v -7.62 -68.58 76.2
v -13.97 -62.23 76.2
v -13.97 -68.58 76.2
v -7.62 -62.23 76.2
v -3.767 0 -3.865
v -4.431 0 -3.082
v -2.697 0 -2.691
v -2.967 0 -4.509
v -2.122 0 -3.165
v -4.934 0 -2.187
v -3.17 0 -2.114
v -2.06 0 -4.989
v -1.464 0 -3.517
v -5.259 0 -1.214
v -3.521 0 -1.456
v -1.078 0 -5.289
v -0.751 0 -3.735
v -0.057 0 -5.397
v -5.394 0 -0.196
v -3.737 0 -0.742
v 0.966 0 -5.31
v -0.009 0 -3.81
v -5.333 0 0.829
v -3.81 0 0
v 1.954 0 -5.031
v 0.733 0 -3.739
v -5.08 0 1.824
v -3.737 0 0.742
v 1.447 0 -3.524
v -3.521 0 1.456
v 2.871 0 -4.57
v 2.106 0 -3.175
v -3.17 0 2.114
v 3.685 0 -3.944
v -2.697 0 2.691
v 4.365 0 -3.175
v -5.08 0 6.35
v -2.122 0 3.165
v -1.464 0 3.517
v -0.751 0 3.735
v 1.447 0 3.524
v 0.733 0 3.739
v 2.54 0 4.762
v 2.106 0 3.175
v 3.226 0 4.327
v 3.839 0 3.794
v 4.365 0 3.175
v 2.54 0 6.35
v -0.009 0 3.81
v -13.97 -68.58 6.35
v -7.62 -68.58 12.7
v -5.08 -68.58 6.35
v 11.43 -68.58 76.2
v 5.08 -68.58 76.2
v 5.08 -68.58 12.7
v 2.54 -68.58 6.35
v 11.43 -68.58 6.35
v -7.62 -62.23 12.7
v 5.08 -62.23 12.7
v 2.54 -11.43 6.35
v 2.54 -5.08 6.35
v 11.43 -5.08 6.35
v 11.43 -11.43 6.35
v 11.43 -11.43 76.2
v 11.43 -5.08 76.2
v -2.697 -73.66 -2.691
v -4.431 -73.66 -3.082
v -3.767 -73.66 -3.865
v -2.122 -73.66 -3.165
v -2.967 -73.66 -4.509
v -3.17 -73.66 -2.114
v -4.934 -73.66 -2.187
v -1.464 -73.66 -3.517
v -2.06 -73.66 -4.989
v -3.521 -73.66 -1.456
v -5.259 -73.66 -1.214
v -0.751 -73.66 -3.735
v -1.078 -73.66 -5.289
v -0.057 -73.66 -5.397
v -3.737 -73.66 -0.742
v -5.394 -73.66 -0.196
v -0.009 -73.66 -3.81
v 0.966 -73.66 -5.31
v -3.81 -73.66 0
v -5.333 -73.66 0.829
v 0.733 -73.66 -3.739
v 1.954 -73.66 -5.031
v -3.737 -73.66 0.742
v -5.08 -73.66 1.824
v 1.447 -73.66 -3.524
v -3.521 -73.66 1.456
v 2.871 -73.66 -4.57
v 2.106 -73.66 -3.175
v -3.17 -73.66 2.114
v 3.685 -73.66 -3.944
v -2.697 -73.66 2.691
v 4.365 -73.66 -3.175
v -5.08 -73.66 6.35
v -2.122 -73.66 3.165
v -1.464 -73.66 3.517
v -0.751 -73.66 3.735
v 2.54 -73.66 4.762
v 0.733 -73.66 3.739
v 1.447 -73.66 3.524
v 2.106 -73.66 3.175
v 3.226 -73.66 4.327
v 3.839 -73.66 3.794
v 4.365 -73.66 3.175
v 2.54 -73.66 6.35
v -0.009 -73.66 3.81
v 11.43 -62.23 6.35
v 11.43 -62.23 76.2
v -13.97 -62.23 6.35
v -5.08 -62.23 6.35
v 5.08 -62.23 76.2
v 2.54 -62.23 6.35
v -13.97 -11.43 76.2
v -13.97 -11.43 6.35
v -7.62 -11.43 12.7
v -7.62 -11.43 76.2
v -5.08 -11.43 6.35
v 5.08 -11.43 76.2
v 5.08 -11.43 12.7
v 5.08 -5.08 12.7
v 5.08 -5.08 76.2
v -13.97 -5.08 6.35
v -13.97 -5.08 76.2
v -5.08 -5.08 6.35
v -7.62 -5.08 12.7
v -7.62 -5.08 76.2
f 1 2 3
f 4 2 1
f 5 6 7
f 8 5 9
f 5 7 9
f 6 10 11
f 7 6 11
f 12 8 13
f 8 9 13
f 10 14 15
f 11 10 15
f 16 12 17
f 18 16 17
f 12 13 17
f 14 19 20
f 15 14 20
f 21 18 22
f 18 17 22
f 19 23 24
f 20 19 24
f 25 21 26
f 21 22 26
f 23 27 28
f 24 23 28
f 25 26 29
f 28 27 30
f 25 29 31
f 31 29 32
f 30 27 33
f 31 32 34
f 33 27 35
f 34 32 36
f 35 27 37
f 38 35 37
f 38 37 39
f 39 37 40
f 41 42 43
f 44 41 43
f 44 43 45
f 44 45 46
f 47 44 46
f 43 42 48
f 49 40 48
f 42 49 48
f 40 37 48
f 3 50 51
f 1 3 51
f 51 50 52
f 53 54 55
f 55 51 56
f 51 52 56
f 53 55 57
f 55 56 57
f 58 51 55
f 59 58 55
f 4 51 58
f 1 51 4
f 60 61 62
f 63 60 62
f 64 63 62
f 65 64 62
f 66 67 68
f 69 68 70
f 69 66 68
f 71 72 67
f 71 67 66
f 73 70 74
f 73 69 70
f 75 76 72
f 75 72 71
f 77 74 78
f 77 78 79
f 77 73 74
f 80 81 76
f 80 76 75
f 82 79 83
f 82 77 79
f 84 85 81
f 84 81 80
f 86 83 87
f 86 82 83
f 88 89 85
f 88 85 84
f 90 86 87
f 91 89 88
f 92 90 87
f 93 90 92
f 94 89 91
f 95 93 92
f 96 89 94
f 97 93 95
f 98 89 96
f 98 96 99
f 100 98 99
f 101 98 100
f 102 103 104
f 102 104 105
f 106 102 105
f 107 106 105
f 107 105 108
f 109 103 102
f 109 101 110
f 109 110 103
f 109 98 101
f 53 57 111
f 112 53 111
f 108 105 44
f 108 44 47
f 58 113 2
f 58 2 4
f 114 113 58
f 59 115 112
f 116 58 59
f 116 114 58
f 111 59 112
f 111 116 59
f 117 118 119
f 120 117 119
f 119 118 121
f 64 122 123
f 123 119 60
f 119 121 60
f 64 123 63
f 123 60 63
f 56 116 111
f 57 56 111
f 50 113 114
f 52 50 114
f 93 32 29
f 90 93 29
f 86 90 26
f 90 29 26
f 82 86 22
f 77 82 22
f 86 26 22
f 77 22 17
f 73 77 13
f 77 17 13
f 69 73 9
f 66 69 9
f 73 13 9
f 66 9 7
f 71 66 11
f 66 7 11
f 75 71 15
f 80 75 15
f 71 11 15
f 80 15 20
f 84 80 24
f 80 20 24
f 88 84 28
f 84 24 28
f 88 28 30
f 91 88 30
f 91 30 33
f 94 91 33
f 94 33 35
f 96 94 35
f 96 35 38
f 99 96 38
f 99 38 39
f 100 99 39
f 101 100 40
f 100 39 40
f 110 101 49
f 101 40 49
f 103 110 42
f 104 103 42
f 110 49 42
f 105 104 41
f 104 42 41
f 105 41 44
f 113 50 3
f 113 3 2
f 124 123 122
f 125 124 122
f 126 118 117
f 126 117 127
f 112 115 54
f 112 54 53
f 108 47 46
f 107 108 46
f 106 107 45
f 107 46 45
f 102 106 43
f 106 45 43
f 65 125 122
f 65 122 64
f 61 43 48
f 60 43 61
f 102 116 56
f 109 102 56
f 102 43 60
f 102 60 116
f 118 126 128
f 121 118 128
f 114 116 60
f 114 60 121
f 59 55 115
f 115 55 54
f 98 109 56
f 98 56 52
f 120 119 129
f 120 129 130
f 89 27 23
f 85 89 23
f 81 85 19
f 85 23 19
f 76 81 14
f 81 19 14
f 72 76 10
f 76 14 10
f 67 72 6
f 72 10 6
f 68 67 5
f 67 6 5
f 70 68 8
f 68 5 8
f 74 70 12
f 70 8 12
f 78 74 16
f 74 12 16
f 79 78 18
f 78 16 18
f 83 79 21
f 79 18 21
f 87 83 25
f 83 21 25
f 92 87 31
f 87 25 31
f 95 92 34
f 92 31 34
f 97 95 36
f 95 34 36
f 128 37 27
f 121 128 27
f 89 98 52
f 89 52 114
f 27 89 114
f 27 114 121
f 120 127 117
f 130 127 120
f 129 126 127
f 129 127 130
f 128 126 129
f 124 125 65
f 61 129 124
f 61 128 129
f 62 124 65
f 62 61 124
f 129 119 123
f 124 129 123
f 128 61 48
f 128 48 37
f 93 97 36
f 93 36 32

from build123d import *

# Parameters (mm, degrees)
F1_DEPTH = 73.66
F3_DEPTH = 73.66
F4_W     = 25.4
F4_H     = 6.349999
F4_H_2   = 6.35
F5_DEPTH = 69.85
F6_W     = 12.7
F6_H     = 63.5
F7_DEPTH = 63.5


with BuildPart() as f1:
    # F0 (on Front) → F1 (new body)
    with BuildSketch(Plane.XZ):
        with BuildLine():
            ThreePointArc((2.106057, -3.175), (-3.81, 0), (2.106057, 3.175))
            Line((2.106057, 3.175), (4.364903, 3.175))
            ThreePointArc((4.364903, 3.175), (-5.3975, 0), (4.364903, -3.175))
            Line((4.364903, -3.175), (2.106057, -3.175))
        make_face()
    extrude(amount=F1_DEPTH)

    # F2 (on face) → F3 (join, through all)
    with BuildSketch(Plane.XZ.offset(73.66)):
        with BuildLine():
            Line((-5.08, 6.35), (-5.08, 1.823899))
            ThreePointArc((-5.08, 1.823899), (-1.942098, 5.035997), (2.54, 4.7625))
            Line((2.54, 4.7625), (2.54, 6.35))
            Line((2.54, 6.35), (-5.08, 6.35))
        make_face()
    extrude(amount=-F3_DEPTH)

    # F4 (on face) → F5 (join)
    with BuildSketch(Plane.XY.offset(6.35)):
        with Locations((-1.27, -65.405)):
            Rectangle(F4_W, F4_H)
        with Locations((-1.27, -8.255)):
            Rectangle(F4_W, F4_H_2)
    extrude(amount=F5_DEPTH)

    # F6 (on face) → F7 (cut, through all)
    with BuildSketch(Plane.XZ.offset(68.58)):
        with Locations((-1.27, 44.45)):
            Rectangle(F6_W, F6_H)
    extrude(amount=-F7_DEPTH, mode=Mode.SUBTRACT)


solid = f1.part
